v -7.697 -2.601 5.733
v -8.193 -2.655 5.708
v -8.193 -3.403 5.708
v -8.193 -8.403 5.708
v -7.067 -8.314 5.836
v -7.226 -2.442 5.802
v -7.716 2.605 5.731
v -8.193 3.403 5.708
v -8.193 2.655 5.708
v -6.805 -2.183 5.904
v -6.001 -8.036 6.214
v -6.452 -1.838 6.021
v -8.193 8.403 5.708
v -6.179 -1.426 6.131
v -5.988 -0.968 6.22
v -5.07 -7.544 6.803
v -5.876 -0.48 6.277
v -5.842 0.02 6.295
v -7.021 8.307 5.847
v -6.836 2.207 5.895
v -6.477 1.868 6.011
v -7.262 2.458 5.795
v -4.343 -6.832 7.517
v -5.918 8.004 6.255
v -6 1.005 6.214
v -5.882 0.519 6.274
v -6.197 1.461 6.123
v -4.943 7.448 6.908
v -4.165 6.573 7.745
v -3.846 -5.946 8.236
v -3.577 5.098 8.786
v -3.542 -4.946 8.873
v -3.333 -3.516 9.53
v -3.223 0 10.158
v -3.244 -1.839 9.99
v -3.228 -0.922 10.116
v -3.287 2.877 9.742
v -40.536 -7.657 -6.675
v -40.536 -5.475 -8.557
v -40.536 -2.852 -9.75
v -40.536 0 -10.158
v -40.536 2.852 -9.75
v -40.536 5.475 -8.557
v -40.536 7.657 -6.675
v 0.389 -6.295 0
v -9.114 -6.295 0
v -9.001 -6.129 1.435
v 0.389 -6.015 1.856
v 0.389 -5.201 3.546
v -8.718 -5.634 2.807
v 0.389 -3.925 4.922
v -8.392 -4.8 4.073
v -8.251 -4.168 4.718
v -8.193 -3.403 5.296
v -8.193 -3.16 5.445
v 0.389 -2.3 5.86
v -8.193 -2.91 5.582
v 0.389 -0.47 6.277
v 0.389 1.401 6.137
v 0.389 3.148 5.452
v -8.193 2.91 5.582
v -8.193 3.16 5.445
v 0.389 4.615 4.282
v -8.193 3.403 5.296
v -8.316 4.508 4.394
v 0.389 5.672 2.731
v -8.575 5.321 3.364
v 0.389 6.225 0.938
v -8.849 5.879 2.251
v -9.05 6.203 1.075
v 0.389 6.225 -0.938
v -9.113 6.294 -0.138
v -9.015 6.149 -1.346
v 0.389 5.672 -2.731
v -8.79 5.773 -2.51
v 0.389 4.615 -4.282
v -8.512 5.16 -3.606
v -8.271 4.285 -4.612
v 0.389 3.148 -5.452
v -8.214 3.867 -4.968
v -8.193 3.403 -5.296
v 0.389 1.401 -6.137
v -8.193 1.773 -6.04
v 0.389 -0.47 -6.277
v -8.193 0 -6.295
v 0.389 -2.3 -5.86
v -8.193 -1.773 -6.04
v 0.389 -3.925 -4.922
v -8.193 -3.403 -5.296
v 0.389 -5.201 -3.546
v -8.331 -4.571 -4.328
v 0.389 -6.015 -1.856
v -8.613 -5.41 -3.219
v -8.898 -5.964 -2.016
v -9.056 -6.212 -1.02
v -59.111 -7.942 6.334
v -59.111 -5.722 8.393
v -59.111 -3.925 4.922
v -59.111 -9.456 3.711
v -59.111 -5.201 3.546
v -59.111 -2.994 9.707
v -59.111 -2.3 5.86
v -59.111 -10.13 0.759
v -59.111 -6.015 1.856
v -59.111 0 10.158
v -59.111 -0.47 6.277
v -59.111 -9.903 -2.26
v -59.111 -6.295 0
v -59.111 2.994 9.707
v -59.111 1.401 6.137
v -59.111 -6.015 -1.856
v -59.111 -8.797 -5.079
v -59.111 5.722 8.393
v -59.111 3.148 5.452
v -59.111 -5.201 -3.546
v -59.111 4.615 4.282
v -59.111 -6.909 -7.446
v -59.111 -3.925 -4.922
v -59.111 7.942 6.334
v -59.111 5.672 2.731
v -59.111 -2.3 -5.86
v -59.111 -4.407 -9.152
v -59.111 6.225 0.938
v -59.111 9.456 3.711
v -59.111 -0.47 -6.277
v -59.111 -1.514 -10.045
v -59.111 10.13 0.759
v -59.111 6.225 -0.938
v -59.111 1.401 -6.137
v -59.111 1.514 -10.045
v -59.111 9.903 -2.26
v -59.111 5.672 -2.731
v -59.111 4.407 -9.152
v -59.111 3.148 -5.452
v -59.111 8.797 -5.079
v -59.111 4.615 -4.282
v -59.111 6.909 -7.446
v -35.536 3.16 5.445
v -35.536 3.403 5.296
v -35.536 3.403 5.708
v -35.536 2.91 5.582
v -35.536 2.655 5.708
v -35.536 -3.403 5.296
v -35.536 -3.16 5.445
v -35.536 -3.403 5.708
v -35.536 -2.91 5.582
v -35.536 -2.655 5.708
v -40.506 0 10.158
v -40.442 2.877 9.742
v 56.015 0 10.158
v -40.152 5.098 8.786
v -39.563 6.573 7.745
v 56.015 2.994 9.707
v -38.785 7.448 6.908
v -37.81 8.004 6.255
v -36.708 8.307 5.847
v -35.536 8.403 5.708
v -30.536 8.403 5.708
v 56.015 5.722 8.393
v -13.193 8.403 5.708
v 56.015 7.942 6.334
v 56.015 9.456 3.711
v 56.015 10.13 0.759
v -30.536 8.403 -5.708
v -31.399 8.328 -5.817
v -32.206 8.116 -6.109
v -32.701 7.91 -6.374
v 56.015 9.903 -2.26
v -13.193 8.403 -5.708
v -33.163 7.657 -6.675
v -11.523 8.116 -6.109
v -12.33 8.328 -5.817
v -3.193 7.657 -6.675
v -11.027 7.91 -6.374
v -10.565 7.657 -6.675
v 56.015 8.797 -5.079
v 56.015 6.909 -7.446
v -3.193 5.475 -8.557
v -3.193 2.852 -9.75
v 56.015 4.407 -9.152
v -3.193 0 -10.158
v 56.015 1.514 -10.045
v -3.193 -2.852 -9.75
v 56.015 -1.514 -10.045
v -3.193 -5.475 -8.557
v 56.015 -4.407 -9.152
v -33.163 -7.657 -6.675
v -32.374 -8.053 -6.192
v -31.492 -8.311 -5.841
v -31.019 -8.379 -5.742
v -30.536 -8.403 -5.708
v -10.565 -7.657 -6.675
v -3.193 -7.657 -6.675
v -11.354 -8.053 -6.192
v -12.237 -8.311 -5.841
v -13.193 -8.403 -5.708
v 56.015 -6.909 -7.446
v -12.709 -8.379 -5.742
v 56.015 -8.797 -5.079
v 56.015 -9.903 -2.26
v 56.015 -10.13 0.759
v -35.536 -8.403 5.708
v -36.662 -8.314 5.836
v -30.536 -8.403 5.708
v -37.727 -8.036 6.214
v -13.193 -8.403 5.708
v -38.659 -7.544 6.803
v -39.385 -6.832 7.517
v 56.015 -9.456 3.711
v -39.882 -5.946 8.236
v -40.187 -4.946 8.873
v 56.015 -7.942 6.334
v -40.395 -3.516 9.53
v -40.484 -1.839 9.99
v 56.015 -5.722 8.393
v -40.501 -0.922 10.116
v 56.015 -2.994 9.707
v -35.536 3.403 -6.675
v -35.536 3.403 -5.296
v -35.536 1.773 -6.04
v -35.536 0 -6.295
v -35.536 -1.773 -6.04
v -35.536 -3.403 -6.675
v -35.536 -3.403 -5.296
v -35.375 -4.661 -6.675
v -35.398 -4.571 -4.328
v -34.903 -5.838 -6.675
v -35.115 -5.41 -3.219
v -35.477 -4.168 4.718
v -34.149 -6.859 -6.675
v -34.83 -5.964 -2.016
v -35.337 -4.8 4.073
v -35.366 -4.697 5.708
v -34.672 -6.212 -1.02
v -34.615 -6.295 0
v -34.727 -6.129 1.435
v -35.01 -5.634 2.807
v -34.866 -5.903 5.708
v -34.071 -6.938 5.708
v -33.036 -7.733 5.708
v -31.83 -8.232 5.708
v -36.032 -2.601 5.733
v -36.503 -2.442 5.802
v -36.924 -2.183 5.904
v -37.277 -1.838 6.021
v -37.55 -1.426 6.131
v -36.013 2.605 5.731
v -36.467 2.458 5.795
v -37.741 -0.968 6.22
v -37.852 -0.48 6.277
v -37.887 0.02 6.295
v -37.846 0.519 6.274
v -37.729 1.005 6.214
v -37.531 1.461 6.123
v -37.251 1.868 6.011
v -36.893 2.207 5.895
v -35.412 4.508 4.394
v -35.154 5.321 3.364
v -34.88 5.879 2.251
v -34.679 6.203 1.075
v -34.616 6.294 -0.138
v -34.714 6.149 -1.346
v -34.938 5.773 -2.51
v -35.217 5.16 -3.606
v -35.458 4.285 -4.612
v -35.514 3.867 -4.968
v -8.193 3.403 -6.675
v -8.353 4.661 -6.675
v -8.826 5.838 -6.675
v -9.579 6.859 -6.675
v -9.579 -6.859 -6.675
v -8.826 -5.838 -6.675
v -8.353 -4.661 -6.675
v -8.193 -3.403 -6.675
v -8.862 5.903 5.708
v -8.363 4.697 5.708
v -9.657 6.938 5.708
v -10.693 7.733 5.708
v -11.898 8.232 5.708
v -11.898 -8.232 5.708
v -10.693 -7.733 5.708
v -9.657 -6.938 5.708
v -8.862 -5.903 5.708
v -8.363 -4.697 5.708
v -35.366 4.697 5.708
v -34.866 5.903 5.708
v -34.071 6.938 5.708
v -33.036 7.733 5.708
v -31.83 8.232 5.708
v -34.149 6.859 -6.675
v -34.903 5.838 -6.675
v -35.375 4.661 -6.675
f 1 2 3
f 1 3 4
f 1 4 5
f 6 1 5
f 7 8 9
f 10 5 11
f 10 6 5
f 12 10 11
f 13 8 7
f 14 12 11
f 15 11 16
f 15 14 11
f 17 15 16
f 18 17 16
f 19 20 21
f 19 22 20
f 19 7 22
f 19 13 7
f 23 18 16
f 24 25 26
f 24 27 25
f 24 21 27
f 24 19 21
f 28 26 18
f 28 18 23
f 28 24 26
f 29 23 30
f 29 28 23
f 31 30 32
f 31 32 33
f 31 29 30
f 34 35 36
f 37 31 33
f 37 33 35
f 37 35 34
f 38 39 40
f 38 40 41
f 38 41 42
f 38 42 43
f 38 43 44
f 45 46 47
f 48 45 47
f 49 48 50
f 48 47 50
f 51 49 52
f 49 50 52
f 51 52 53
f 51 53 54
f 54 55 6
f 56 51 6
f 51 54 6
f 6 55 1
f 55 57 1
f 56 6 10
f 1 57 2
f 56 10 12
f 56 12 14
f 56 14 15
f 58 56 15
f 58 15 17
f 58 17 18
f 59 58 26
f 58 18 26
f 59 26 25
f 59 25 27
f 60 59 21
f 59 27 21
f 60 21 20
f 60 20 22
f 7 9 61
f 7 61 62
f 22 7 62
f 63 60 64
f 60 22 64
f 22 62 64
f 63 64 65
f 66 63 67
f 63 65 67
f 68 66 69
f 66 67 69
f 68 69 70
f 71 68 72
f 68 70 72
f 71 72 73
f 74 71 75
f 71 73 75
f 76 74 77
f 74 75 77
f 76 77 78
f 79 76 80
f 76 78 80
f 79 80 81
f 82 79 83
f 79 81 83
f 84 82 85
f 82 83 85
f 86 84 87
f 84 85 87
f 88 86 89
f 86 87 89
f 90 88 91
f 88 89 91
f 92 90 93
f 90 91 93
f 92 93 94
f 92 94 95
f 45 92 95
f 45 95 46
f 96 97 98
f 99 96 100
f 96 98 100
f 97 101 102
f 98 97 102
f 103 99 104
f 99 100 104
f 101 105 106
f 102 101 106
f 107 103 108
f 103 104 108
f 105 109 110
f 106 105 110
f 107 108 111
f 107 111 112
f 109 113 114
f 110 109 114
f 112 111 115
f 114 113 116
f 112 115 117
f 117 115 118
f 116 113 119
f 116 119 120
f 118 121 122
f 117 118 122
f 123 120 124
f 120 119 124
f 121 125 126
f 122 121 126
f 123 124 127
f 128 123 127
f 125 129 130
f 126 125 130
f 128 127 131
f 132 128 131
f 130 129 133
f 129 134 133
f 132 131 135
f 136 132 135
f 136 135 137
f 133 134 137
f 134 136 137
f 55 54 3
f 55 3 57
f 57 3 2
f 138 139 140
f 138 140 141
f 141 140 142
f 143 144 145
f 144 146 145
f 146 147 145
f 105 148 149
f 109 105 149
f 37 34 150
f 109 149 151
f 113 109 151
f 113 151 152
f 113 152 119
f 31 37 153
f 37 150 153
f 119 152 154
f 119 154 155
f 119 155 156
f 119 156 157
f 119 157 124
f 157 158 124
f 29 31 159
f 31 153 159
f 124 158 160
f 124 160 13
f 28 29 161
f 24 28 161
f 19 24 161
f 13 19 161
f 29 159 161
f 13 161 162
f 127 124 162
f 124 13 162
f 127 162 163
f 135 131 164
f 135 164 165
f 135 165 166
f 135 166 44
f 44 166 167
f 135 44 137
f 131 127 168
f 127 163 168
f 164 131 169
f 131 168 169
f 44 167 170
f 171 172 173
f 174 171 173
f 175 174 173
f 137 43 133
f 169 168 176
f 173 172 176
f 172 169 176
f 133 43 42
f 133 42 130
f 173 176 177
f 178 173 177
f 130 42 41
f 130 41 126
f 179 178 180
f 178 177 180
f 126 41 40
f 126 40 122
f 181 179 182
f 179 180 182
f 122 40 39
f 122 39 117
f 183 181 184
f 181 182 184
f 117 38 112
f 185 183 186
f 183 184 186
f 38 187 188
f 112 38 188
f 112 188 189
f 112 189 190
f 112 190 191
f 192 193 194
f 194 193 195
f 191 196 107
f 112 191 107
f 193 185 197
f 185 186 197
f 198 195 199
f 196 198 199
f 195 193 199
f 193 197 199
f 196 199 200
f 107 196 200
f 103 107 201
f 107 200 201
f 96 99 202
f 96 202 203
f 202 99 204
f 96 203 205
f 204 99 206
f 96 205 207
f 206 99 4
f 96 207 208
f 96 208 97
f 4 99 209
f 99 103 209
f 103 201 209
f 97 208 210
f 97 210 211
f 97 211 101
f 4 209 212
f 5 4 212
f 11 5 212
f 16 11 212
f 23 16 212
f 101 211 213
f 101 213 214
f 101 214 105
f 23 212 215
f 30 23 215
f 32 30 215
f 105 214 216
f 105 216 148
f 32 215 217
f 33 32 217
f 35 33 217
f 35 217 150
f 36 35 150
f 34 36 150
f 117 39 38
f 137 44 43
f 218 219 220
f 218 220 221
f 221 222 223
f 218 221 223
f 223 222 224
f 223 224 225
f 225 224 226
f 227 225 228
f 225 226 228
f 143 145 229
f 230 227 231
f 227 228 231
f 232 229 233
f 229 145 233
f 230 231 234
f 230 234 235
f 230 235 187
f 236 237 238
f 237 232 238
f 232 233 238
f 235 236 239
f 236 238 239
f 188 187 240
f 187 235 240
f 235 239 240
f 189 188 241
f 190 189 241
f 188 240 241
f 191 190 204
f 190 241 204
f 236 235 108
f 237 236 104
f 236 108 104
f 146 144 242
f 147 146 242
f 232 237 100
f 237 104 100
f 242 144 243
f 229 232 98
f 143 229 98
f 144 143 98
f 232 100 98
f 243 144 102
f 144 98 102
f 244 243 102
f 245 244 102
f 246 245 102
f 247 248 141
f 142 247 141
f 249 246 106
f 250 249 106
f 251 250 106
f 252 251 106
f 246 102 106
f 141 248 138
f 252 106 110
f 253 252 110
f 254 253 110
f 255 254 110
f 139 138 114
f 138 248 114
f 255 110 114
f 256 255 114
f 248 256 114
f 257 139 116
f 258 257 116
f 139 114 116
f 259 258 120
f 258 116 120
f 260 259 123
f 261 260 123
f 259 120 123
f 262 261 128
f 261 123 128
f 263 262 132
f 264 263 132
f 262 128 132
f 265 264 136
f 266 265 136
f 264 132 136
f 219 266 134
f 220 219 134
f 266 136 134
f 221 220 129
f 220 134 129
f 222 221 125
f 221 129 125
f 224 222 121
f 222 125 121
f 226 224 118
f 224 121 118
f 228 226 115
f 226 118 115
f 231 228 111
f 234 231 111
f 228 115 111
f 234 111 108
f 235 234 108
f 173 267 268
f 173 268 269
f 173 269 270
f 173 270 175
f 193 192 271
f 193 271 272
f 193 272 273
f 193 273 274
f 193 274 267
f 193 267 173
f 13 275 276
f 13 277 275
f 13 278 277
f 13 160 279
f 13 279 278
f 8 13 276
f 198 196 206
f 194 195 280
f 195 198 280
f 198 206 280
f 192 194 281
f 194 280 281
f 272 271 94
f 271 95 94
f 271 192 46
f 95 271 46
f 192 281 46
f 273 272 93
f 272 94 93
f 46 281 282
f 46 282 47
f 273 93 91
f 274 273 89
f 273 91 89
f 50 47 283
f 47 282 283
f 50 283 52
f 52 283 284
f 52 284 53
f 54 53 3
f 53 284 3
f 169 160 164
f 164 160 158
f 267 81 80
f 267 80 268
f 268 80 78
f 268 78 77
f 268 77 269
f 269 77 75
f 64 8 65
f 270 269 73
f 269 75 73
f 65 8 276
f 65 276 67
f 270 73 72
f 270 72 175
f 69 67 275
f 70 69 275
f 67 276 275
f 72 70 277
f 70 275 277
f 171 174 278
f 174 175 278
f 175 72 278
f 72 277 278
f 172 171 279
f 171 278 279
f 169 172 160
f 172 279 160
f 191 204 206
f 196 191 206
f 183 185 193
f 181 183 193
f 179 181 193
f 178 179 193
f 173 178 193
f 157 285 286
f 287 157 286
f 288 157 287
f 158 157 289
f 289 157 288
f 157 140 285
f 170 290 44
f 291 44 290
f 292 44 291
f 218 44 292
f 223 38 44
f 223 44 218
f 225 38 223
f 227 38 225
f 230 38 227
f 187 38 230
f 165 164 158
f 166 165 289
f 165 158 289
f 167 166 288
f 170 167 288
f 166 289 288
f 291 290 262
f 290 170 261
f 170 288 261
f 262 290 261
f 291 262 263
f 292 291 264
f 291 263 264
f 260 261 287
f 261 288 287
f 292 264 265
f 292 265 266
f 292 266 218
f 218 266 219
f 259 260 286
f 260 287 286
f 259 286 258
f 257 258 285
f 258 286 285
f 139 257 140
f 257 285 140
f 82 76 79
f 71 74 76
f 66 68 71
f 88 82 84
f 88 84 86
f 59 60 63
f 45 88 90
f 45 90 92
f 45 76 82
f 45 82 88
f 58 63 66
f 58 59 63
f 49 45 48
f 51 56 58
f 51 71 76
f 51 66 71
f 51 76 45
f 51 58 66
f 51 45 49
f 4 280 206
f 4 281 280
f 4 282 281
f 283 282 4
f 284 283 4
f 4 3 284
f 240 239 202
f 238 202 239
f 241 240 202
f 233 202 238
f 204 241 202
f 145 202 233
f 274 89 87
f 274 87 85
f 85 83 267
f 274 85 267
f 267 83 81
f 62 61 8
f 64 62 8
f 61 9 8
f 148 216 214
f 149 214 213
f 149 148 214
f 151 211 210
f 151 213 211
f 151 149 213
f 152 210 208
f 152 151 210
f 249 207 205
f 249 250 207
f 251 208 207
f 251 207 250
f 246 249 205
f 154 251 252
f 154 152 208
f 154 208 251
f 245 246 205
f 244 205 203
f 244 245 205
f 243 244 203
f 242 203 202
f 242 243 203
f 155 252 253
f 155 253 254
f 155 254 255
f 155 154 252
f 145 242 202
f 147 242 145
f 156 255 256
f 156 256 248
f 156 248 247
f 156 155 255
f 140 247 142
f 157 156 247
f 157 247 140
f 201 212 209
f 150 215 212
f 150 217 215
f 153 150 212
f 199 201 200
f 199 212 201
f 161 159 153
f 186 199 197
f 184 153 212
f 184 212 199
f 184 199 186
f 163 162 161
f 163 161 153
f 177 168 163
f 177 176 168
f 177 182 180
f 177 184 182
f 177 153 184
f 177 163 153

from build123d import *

# Parameters (mm, degrees)
F0_W     = 115.125928
F0_H     = 10.15817
F2_W     = 37.343366
F2_H     = 12.383293
F3_DEPTH = 25
F4_R     = 6.295086
F5_DEPTH = 59.5
F7_DEPTH = 25


with BuildPart() as f1:
    # F0 (on Front) → F1 (revolve)
    with BuildSketch(Plane.XZ):
        with Locations((-1.547912, 5.079085)):
            Rectangle(F0_W, F0_H)
    revolve(axis=Axis((-1.547912, 0, 0), (-1, 0, 0)))

    # F2 (on Front) → F3 (cut, symmetric)
    with BuildSketch(Plane.XZ):
        with BuildLine():
            Line((-3.192568, 19.639129), (-40.535934, 19.639129))
            Line((-40.535934, 19.639129), (-40.535934, 10.707924))
            ThreePointArc((-40.535934, 10.707924), (-39.071468, 7.17239), (-35.535934, 5.707924))
            Line((-35.535934, 5.707924), (-8.192568, 5.707924))
            ThreePointArc((-8.192568, 5.707924), (-4.657034, 7.17239), (-3.192568, 10.707924))
            Line((-3.192568, 10.707924), (-3.192568, 19.639129))
        make_face()
        with Locations((-21.864251, -12.867015)):
            Rectangle(F2_W, F2_H)
    extrude(amount=F3_DEPTH, both=True, mode=Mode.SUBTRACT)

    # F4 (on face) → F5 (cut)
    with BuildSketch(Plane(origin=(-59.110876, 0, 0), x_dir=(0, -1, 0), z_dir=(-1, 0, 0))):
        Circle(F4_R)
    extrude(amount=-F5_DEPTH, mode=Mode.SUBTRACT)

    # F6 (on Top) → F7 (cut, symmetric)
    with BuildSketch(Plane.XY):
        with BuildLine():
            Line((-13.192568, 8.402858), (-30.535934, 8.402858))
            ThreePointArc((-30.535934, 8.402858), (-34.071468, 6.938392), (-35.535934, 3.402858))
            Line((-35.535934, 3.402858), (-35.535934, -3.402858))
            ThreePointArc((-35.535934, -3.402858), (-34.071468, -6.938392), (-30.535934, -8.402858))
            Line((-30.535934, -8.402858), (-13.192568, -8.402858))
            ThreePointArc((-13.192568, -8.402858), (-9.657034, -6.938392), (-8.192568, -3.402858))
            Line((-8.192568, -3.402858), (-8.192568, 3.402858))
            ThreePointArc((-8.192568, 3.402858), (-9.657034, 6.938392), (-13.192568, 8.402858))
        make_face()
    extrude(amount=F7_DEPTH, both=True, mode=Mode.SUBTRACT)


solid = f1.part
